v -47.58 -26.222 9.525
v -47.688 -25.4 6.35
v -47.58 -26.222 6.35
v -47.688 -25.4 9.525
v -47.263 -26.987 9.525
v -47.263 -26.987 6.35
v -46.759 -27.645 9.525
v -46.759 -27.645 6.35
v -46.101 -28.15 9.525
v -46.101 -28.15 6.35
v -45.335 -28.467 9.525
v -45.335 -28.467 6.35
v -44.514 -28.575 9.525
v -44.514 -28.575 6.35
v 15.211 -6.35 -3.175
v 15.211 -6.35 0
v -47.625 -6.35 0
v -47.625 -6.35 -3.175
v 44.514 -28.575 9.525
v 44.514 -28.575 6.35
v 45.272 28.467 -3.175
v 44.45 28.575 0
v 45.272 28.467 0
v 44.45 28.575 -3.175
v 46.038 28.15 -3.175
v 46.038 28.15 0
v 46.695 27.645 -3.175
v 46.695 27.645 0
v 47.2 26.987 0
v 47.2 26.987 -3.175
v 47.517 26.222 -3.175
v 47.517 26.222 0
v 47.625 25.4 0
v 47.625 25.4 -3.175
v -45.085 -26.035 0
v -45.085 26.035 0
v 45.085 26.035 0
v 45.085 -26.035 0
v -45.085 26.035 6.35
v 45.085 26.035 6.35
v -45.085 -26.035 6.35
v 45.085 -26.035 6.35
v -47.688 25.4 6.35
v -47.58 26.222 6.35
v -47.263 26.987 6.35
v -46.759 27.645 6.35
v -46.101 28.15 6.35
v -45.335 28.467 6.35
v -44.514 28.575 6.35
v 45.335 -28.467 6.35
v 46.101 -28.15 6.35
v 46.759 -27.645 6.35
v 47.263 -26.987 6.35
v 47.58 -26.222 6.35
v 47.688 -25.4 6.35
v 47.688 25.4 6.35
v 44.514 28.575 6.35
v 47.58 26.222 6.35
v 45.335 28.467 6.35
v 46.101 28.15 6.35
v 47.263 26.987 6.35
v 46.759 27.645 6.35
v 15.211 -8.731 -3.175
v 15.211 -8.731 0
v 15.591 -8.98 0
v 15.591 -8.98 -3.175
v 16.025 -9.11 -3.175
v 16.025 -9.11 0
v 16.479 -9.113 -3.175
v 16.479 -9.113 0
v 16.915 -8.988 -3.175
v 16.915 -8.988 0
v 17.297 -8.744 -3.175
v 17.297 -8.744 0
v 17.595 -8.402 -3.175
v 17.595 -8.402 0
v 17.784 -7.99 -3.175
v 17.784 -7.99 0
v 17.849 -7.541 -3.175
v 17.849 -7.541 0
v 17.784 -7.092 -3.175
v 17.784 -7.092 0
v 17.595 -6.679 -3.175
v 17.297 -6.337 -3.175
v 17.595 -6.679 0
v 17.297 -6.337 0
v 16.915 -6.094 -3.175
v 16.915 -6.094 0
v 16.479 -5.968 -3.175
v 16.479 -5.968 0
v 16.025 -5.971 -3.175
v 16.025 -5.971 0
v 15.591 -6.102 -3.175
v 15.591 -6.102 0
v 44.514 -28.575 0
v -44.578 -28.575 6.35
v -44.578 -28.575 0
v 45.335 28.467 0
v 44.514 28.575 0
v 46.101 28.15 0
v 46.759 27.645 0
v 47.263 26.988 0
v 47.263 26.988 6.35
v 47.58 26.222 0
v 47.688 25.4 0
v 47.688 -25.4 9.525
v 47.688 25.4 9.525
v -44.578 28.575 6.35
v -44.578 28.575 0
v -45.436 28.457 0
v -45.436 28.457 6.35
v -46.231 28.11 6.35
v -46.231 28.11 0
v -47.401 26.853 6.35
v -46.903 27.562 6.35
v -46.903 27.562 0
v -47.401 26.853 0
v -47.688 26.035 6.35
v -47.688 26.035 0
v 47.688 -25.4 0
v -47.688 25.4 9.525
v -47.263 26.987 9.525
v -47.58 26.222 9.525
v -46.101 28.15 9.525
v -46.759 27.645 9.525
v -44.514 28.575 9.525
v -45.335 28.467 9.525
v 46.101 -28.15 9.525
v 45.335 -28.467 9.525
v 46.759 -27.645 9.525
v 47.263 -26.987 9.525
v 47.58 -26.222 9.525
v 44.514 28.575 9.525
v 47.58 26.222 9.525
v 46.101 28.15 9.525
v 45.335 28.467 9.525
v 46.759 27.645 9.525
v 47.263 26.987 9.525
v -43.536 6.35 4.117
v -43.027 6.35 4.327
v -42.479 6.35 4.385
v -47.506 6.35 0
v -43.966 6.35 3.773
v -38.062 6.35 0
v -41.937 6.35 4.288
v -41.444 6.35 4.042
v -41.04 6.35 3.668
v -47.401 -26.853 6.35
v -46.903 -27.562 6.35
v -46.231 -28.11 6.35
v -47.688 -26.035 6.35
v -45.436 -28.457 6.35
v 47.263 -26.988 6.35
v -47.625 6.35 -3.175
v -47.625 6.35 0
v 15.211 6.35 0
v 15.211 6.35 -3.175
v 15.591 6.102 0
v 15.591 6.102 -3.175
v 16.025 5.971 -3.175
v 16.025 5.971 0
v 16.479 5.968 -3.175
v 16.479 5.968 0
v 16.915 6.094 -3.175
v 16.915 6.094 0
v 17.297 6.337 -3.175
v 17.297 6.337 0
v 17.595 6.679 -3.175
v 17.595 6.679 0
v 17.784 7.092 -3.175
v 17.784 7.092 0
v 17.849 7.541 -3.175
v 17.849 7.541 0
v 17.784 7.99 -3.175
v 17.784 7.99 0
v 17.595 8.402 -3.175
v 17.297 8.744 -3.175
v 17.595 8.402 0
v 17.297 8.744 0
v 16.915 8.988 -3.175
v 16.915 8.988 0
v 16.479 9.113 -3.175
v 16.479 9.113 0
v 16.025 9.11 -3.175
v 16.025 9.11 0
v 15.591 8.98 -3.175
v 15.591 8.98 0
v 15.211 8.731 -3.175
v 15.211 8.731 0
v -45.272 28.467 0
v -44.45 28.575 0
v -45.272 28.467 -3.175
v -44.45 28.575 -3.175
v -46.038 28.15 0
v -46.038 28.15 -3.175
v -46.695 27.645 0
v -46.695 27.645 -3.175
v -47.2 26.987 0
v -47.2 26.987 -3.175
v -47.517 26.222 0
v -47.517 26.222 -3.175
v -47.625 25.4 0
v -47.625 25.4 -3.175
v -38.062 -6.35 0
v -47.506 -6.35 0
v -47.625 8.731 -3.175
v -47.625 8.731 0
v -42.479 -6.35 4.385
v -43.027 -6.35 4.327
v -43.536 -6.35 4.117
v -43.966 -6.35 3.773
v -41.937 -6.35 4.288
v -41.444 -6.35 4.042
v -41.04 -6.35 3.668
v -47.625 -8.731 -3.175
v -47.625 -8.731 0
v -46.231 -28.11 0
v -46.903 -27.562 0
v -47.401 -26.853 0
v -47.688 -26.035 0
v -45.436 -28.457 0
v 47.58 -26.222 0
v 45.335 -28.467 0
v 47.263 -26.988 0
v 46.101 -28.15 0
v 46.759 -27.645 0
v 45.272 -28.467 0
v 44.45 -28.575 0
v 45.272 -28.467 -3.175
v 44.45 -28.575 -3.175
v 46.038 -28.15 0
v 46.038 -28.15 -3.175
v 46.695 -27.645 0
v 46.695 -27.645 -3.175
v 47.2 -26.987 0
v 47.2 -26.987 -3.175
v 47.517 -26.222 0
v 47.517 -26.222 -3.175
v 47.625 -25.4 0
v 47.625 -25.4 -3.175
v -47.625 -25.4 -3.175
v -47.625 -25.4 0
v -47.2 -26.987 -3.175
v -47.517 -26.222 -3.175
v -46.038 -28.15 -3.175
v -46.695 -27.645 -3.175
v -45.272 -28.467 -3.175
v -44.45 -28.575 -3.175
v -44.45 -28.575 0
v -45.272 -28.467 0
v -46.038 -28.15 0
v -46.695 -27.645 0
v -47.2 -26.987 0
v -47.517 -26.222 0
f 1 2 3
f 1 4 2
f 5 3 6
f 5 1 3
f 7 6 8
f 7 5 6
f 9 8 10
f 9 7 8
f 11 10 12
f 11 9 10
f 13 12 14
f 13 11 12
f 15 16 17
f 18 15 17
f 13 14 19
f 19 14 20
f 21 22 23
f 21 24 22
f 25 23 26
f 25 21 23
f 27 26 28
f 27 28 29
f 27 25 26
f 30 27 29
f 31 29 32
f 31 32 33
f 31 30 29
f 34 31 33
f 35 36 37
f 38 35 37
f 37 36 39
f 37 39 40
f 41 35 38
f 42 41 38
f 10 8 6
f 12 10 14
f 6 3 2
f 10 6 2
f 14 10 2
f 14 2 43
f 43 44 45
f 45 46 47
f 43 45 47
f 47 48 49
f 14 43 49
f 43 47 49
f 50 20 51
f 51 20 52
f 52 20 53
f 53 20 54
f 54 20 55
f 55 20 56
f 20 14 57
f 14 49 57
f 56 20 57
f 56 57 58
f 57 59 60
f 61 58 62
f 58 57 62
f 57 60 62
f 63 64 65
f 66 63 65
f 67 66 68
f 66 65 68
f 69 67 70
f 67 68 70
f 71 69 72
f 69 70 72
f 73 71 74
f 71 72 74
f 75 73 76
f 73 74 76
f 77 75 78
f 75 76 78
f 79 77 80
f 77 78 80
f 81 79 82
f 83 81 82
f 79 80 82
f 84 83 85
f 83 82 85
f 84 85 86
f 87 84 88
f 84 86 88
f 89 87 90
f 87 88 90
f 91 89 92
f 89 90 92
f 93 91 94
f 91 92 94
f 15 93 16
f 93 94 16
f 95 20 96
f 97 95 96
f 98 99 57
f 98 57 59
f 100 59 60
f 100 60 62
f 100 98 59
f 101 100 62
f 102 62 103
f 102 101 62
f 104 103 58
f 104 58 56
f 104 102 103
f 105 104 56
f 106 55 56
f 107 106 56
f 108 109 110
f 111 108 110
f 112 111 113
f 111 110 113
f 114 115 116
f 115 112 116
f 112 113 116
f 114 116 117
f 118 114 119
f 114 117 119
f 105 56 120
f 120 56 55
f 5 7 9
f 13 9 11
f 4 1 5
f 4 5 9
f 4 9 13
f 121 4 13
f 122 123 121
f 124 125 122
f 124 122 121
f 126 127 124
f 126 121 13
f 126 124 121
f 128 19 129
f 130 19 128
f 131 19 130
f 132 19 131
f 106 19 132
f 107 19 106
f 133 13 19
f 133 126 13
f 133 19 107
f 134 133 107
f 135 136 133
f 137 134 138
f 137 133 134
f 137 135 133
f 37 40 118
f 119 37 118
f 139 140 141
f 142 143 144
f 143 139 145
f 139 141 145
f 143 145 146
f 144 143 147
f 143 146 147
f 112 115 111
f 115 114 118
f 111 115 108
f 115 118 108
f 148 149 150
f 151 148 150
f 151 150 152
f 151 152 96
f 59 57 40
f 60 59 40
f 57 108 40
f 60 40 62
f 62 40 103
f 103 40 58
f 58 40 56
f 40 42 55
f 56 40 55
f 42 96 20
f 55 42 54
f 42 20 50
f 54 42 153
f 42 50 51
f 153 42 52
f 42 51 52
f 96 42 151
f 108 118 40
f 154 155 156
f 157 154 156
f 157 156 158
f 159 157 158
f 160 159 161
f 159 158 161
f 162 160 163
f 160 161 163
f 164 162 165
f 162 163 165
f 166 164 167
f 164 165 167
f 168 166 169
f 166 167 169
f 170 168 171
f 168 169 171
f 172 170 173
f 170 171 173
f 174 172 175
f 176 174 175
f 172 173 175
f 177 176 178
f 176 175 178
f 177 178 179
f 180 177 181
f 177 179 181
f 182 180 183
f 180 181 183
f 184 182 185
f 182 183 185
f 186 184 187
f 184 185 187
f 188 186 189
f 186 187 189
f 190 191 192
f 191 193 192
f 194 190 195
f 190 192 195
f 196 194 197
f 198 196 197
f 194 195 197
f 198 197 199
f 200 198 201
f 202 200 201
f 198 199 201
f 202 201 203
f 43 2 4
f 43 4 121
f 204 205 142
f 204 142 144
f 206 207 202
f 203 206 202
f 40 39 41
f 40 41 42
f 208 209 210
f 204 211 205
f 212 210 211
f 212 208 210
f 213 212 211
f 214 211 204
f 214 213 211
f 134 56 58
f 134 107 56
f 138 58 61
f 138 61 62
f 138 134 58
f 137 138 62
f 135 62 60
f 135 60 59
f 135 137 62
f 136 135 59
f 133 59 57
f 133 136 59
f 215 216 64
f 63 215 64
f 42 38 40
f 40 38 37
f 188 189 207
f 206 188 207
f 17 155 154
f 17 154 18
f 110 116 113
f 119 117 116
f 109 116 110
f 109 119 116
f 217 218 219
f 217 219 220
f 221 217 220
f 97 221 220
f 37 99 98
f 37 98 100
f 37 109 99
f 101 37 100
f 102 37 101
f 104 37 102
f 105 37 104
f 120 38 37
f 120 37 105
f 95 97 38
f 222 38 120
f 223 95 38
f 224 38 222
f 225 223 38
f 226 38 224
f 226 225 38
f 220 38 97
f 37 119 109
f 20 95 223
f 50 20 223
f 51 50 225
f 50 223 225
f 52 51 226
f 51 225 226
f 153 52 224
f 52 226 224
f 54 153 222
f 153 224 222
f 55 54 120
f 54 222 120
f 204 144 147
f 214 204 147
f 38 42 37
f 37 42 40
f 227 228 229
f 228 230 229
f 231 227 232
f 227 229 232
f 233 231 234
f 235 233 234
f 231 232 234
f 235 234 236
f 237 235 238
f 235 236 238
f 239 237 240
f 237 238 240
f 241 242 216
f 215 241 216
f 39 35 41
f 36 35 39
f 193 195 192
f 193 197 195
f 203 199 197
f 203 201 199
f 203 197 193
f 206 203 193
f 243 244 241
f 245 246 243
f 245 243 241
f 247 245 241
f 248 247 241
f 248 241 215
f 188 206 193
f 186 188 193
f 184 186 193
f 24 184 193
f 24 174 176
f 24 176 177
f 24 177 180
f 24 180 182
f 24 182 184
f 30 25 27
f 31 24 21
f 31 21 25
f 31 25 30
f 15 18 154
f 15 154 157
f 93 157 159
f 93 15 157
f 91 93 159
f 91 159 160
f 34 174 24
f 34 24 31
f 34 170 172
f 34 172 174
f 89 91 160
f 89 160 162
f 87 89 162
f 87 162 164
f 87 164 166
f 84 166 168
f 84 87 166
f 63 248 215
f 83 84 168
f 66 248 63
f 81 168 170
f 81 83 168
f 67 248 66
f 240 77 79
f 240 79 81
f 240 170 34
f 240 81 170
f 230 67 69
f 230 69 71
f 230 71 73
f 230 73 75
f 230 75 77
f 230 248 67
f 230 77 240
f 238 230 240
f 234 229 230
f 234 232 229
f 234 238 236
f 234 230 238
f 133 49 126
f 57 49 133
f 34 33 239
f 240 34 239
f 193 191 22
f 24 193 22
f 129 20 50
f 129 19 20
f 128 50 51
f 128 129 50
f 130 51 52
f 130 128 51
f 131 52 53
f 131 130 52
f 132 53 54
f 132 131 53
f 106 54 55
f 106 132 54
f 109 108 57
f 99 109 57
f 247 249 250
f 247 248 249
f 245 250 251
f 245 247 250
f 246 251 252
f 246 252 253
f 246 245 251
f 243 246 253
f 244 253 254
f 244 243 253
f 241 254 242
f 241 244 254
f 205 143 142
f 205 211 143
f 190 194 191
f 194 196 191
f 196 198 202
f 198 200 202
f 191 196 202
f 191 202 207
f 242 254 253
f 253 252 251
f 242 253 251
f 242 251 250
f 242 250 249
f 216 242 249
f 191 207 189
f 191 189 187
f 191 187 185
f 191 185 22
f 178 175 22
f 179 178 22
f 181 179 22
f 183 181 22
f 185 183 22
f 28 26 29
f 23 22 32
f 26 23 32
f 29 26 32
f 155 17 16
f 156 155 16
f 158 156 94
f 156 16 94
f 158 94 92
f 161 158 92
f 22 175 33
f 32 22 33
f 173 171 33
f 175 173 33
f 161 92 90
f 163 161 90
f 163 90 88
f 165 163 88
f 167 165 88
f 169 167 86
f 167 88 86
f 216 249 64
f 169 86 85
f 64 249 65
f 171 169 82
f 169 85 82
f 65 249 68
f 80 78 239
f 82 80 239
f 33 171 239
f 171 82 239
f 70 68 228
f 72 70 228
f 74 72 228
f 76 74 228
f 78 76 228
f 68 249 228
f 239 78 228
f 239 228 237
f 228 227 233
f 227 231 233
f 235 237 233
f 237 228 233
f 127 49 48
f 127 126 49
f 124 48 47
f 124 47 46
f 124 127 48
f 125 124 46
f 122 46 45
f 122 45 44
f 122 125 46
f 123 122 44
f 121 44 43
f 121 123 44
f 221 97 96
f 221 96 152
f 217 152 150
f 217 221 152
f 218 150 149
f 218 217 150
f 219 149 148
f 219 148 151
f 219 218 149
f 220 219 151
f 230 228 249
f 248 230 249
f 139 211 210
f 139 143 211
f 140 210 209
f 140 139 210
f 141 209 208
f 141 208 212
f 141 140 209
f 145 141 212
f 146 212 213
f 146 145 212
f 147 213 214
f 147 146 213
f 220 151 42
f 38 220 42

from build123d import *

# Parameters (mm, degrees)
F0_W           = 90.17
F0_H           = 52.07
F1_DEPTH       = 6.35
F2_W           = 95.377
F2_H           = 57.15
F2_W_2         = 90.17
F2_H_2         = 52.07
F3_DEPTH       = 3.175
F4_W           = 2.54
F4_H           = 12.7
F5_DEPTH       = 3.175
F8_DEPTH       = 6.35
F10_DEPTH      = 6.35
F11_R          = 1.9431941061
F12_F1_R       = 3.175
F12_F2_R       = 3.175
F12_F3_R       = 3.175
F12_F4_R       = 3.175
F12_2_F1_R     = 3.175
F12_2_F2_R     = 3.175
F12_2_F3_R     = 3.175
F12_2_F4_R     = 3.175
F12_3_T1_DEPTH = 21.9042598667
F12_3_T3_DEPTH = 22.225


# Not quite as in the source:
# - a fillet or chamfer that OpenCascade refuses, or shapes differently, is made with other operations: its cross-section is extruded or revolved along the edge and cut away or added


with BuildPart() as f1:
    # F0 (on Top) → F1 (new body)
    with BuildSketch(Plane.XY):
        Rectangle(F0_W, F0_H)
    extrude(amount=F1_DEPTH)


with BuildPart() as f3:
    # F2 (on face) → F3 (new body)
    with BuildSketch(Plane.XY.offset(6.35)):
        Rectangle(F2_W, F2_H)
        Rectangle(F2_W_2, F2_H_2, mode=Mode.SUBTRACT)
        Rectangle(F2_W_2, F2_H_2)
    extrude(amount=F3_DEPTH)

    # F12: fillet of radius 3.175 on 4 edges, made by hand

    # F12_f1
    f12_f1_edges = [f3.edges().sort_by_distance(p)[0] for p in [
        (47.6885, -28.575, 7.9375),
    ]]
    fillet(f12_f1_edges, radius=F12_F1_R)

    # F12_f2
    f12_f2_edges = [f3.edges().sort_by_distance(p)[0] for p in [
        (47.6885, 28.575, 7.9375),
    ]]
    fillet(f12_f2_edges, radius=F12_F2_R)

    # F12_f3
    f12_f3_edges = [f3.edges().sort_by_distance(p)[0] for p in [
        (-47.6885, 28.575, 7.9375),
    ]]
    fillet(f12_f3_edges, radius=F12_F3_R)

    # F12_f4
    f12_f4_edges = [f3.edges().sort_by_distance(p)[0] for p in [
        (-47.6885, -28.575, 7.9375),
    ]]
    fillet(f12_f4_edges, radius=F12_F4_R)


with BuildPart() as f5:
    # F4 (on face) → F5 (new body)
    with BuildSketch(Plane(origin=(0, 0, 0), x_dir=(1, 0, 0), z_dir=(0, 0, -1))):
        Polygon((47.625, 28.575), (-47.625, 28.575), (-47.625, 8.73125), (-45.085, 8.73125), (-45.085, 26.035), (45.085, 26.035), (45.085, -26.035), (-45.085, -26.035), (-45.085, -8.73125), (-47.625, -8.73125), (-47.625, -28.575), (47.625, -28.575), align=None)
        with BuildLine():
            Line((-45.085, 26.035), (-45.085, 8.73125))
            Line((-45.085, 8.73125), (15.2114481971, 8.73125))
            ThreePointArc((15.2114481971, 8.73125), (17.8489807487, 7.540625), (15.2114481971, 6.35))
            Line((15.2114481971, 6.35), (-45.085, 6.35))
            Line((-45.085, 6.35), (-45.085, -6.35))
            Line((-45.085, -6.35), (15.2114481971, -6.35))
            ThreePointArc((15.2114481971, -6.35), (17.8489807487, -7.540625), (15.2114481971, -8.73125))
            Line((15.2114481971, -8.73125), (-45.085, -8.73125))
            Line((-45.085, -8.73125), (-45.085, -26.035))
            Line((-45.085, -26.035), (45.085, -26.035))
            Line((45.085, -26.035), (45.085, 26.035))
            Line((45.085, 26.035), (-45.085, 26.035))
        make_face()
        with Locations((-46.355, 0)):
            Rectangle(F4_W, F4_H)
    extrude(amount=F5_DEPTH)

    # F12#2: fillet of radius 3.175 on 4 edges, made by hand

    # F12_2_f1
    f12_2_f1_edges = [f5.edges().sort_by_distance(p)[0] for p in [
        (47.625, -28.575, -1.5875),
    ]]
    fillet(f12_2_f1_edges, radius=F12_2_F1_R)

    # F12_2_f2
    f12_2_f2_edges = [f5.edges().sort_by_distance(p)[0] for p in [
        (-47.625, -28.575, -1.5875),
    ]]
    fillet(f12_2_f2_edges, radius=F12_2_F2_R)

    # F12_2_f3
    f12_2_f3_edges = [f5.edges().sort_by_distance(p)[0] for p in [
        (-47.625, 28.575, -1.5875),
    ]]
    fillet(f12_2_f3_edges, radius=F12_2_F3_R)

    # F12_2_f4
    f12_2_f4_edges = [f5.edges().sort_by_distance(p)[0] for p in [
        (47.625, 28.575, -1.5875),
    ]]
    fillet(f12_2_f4_edges, radius=F12_2_F4_R)


with BuildPart() as f8:
    # F7 (on face) → F8 (new body, through all)
    with BuildSketch(Plane(origin=(0, 0, 6.35), x_dir=(1, 0, 0), z_dir=(0, 0, -1))):
        Polygon((47.6885, 28.575), (-47.6885, 28.575), (-47.6885, 26.035), (-45.085, 26.035), (45.085, 26.035), (45.085, -26.035), (-45.085, -26.035), (-47.6885, -26.035), (-47.6885, -28.575), (47.6885, -28.575), align=None)
    extrude(amount=F8_DEPTH)

    # F12#3: fillet of radius 3.175 on 4 edges, made by hand

    # F12_3_s2 → F12_3_t1 (cut)
    with BuildSketch(Plane.XY.offset(-7.7771299333)):
        with BuildLine():
            ThreePointArc((-44.5776480267, -28.575), (-46.5856943409, -27.8593444248), (-47.6885, -26.035))
            Line((-47.6885, -26.035), (-47.6885, -28.575))
            Line((-47.6885, -28.575), (-44.5776480267, -28.575))
        make_face()
        with BuildLine():
            ThreePointArc((-44.5776480267, 28.575), (-46.5856943409, 27.8593444248), (-47.6885, 26.035))
            Line((-47.6885, 26.035), (-47.6885, 28.575))
            Line((-47.6885, 28.575), (-44.5776480267, 28.575))
        make_face()
    extrude(amount=F12_3_T1_DEPTH, mode=Mode.SUBTRACT)

    # F12_3_s4 → F12_3_t3 (cut)
    with BuildSketch(Plane.XY.offset(-7.9375)):
        with BuildLine():
            ThreePointArc((44.5135, -28.575), (46.7585640303, -27.6450640303), (47.6885, -25.4))
            Line((47.6885, -25.4), (47.6885, -28.575))
            Line((47.6885, -28.575), (44.5135, -28.575))
        make_face()
        with BuildLine():
            ThreePointArc((44.5135, 28.575), (46.7585640303, 27.6450640303), (47.6885, 25.4))
            Line((47.6885, 25.4), (47.6885, 28.575))
            Line((47.6885, 28.575), (44.5135, 28.575))
        make_face()
    extrude(amount=F12_3_T3_DEPTH, mode=Mode.SUBTRACT)


with BuildPart() as f10:
    # F9 (on Front) → F10 (new body, symmetric)
    with BuildSketch(Plane.XZ):
        Polygon((-42.4429178238, 5.3962194361), (-47.5056767464, 0), (-38.0619131029, 0), align=None)
    extrude(amount=F10_DEPTH, both=True)

    # F11
    f11_edges = [f10.edges().sort_by_distance(p)[0] for p in [
        (-42.442918, 0, 5.396219),
    ]]
    fillet(f11_edges, radius=F11_R)


solid = Compound([f1.part, f3.part, f5.part, f8.part, f10.part])
